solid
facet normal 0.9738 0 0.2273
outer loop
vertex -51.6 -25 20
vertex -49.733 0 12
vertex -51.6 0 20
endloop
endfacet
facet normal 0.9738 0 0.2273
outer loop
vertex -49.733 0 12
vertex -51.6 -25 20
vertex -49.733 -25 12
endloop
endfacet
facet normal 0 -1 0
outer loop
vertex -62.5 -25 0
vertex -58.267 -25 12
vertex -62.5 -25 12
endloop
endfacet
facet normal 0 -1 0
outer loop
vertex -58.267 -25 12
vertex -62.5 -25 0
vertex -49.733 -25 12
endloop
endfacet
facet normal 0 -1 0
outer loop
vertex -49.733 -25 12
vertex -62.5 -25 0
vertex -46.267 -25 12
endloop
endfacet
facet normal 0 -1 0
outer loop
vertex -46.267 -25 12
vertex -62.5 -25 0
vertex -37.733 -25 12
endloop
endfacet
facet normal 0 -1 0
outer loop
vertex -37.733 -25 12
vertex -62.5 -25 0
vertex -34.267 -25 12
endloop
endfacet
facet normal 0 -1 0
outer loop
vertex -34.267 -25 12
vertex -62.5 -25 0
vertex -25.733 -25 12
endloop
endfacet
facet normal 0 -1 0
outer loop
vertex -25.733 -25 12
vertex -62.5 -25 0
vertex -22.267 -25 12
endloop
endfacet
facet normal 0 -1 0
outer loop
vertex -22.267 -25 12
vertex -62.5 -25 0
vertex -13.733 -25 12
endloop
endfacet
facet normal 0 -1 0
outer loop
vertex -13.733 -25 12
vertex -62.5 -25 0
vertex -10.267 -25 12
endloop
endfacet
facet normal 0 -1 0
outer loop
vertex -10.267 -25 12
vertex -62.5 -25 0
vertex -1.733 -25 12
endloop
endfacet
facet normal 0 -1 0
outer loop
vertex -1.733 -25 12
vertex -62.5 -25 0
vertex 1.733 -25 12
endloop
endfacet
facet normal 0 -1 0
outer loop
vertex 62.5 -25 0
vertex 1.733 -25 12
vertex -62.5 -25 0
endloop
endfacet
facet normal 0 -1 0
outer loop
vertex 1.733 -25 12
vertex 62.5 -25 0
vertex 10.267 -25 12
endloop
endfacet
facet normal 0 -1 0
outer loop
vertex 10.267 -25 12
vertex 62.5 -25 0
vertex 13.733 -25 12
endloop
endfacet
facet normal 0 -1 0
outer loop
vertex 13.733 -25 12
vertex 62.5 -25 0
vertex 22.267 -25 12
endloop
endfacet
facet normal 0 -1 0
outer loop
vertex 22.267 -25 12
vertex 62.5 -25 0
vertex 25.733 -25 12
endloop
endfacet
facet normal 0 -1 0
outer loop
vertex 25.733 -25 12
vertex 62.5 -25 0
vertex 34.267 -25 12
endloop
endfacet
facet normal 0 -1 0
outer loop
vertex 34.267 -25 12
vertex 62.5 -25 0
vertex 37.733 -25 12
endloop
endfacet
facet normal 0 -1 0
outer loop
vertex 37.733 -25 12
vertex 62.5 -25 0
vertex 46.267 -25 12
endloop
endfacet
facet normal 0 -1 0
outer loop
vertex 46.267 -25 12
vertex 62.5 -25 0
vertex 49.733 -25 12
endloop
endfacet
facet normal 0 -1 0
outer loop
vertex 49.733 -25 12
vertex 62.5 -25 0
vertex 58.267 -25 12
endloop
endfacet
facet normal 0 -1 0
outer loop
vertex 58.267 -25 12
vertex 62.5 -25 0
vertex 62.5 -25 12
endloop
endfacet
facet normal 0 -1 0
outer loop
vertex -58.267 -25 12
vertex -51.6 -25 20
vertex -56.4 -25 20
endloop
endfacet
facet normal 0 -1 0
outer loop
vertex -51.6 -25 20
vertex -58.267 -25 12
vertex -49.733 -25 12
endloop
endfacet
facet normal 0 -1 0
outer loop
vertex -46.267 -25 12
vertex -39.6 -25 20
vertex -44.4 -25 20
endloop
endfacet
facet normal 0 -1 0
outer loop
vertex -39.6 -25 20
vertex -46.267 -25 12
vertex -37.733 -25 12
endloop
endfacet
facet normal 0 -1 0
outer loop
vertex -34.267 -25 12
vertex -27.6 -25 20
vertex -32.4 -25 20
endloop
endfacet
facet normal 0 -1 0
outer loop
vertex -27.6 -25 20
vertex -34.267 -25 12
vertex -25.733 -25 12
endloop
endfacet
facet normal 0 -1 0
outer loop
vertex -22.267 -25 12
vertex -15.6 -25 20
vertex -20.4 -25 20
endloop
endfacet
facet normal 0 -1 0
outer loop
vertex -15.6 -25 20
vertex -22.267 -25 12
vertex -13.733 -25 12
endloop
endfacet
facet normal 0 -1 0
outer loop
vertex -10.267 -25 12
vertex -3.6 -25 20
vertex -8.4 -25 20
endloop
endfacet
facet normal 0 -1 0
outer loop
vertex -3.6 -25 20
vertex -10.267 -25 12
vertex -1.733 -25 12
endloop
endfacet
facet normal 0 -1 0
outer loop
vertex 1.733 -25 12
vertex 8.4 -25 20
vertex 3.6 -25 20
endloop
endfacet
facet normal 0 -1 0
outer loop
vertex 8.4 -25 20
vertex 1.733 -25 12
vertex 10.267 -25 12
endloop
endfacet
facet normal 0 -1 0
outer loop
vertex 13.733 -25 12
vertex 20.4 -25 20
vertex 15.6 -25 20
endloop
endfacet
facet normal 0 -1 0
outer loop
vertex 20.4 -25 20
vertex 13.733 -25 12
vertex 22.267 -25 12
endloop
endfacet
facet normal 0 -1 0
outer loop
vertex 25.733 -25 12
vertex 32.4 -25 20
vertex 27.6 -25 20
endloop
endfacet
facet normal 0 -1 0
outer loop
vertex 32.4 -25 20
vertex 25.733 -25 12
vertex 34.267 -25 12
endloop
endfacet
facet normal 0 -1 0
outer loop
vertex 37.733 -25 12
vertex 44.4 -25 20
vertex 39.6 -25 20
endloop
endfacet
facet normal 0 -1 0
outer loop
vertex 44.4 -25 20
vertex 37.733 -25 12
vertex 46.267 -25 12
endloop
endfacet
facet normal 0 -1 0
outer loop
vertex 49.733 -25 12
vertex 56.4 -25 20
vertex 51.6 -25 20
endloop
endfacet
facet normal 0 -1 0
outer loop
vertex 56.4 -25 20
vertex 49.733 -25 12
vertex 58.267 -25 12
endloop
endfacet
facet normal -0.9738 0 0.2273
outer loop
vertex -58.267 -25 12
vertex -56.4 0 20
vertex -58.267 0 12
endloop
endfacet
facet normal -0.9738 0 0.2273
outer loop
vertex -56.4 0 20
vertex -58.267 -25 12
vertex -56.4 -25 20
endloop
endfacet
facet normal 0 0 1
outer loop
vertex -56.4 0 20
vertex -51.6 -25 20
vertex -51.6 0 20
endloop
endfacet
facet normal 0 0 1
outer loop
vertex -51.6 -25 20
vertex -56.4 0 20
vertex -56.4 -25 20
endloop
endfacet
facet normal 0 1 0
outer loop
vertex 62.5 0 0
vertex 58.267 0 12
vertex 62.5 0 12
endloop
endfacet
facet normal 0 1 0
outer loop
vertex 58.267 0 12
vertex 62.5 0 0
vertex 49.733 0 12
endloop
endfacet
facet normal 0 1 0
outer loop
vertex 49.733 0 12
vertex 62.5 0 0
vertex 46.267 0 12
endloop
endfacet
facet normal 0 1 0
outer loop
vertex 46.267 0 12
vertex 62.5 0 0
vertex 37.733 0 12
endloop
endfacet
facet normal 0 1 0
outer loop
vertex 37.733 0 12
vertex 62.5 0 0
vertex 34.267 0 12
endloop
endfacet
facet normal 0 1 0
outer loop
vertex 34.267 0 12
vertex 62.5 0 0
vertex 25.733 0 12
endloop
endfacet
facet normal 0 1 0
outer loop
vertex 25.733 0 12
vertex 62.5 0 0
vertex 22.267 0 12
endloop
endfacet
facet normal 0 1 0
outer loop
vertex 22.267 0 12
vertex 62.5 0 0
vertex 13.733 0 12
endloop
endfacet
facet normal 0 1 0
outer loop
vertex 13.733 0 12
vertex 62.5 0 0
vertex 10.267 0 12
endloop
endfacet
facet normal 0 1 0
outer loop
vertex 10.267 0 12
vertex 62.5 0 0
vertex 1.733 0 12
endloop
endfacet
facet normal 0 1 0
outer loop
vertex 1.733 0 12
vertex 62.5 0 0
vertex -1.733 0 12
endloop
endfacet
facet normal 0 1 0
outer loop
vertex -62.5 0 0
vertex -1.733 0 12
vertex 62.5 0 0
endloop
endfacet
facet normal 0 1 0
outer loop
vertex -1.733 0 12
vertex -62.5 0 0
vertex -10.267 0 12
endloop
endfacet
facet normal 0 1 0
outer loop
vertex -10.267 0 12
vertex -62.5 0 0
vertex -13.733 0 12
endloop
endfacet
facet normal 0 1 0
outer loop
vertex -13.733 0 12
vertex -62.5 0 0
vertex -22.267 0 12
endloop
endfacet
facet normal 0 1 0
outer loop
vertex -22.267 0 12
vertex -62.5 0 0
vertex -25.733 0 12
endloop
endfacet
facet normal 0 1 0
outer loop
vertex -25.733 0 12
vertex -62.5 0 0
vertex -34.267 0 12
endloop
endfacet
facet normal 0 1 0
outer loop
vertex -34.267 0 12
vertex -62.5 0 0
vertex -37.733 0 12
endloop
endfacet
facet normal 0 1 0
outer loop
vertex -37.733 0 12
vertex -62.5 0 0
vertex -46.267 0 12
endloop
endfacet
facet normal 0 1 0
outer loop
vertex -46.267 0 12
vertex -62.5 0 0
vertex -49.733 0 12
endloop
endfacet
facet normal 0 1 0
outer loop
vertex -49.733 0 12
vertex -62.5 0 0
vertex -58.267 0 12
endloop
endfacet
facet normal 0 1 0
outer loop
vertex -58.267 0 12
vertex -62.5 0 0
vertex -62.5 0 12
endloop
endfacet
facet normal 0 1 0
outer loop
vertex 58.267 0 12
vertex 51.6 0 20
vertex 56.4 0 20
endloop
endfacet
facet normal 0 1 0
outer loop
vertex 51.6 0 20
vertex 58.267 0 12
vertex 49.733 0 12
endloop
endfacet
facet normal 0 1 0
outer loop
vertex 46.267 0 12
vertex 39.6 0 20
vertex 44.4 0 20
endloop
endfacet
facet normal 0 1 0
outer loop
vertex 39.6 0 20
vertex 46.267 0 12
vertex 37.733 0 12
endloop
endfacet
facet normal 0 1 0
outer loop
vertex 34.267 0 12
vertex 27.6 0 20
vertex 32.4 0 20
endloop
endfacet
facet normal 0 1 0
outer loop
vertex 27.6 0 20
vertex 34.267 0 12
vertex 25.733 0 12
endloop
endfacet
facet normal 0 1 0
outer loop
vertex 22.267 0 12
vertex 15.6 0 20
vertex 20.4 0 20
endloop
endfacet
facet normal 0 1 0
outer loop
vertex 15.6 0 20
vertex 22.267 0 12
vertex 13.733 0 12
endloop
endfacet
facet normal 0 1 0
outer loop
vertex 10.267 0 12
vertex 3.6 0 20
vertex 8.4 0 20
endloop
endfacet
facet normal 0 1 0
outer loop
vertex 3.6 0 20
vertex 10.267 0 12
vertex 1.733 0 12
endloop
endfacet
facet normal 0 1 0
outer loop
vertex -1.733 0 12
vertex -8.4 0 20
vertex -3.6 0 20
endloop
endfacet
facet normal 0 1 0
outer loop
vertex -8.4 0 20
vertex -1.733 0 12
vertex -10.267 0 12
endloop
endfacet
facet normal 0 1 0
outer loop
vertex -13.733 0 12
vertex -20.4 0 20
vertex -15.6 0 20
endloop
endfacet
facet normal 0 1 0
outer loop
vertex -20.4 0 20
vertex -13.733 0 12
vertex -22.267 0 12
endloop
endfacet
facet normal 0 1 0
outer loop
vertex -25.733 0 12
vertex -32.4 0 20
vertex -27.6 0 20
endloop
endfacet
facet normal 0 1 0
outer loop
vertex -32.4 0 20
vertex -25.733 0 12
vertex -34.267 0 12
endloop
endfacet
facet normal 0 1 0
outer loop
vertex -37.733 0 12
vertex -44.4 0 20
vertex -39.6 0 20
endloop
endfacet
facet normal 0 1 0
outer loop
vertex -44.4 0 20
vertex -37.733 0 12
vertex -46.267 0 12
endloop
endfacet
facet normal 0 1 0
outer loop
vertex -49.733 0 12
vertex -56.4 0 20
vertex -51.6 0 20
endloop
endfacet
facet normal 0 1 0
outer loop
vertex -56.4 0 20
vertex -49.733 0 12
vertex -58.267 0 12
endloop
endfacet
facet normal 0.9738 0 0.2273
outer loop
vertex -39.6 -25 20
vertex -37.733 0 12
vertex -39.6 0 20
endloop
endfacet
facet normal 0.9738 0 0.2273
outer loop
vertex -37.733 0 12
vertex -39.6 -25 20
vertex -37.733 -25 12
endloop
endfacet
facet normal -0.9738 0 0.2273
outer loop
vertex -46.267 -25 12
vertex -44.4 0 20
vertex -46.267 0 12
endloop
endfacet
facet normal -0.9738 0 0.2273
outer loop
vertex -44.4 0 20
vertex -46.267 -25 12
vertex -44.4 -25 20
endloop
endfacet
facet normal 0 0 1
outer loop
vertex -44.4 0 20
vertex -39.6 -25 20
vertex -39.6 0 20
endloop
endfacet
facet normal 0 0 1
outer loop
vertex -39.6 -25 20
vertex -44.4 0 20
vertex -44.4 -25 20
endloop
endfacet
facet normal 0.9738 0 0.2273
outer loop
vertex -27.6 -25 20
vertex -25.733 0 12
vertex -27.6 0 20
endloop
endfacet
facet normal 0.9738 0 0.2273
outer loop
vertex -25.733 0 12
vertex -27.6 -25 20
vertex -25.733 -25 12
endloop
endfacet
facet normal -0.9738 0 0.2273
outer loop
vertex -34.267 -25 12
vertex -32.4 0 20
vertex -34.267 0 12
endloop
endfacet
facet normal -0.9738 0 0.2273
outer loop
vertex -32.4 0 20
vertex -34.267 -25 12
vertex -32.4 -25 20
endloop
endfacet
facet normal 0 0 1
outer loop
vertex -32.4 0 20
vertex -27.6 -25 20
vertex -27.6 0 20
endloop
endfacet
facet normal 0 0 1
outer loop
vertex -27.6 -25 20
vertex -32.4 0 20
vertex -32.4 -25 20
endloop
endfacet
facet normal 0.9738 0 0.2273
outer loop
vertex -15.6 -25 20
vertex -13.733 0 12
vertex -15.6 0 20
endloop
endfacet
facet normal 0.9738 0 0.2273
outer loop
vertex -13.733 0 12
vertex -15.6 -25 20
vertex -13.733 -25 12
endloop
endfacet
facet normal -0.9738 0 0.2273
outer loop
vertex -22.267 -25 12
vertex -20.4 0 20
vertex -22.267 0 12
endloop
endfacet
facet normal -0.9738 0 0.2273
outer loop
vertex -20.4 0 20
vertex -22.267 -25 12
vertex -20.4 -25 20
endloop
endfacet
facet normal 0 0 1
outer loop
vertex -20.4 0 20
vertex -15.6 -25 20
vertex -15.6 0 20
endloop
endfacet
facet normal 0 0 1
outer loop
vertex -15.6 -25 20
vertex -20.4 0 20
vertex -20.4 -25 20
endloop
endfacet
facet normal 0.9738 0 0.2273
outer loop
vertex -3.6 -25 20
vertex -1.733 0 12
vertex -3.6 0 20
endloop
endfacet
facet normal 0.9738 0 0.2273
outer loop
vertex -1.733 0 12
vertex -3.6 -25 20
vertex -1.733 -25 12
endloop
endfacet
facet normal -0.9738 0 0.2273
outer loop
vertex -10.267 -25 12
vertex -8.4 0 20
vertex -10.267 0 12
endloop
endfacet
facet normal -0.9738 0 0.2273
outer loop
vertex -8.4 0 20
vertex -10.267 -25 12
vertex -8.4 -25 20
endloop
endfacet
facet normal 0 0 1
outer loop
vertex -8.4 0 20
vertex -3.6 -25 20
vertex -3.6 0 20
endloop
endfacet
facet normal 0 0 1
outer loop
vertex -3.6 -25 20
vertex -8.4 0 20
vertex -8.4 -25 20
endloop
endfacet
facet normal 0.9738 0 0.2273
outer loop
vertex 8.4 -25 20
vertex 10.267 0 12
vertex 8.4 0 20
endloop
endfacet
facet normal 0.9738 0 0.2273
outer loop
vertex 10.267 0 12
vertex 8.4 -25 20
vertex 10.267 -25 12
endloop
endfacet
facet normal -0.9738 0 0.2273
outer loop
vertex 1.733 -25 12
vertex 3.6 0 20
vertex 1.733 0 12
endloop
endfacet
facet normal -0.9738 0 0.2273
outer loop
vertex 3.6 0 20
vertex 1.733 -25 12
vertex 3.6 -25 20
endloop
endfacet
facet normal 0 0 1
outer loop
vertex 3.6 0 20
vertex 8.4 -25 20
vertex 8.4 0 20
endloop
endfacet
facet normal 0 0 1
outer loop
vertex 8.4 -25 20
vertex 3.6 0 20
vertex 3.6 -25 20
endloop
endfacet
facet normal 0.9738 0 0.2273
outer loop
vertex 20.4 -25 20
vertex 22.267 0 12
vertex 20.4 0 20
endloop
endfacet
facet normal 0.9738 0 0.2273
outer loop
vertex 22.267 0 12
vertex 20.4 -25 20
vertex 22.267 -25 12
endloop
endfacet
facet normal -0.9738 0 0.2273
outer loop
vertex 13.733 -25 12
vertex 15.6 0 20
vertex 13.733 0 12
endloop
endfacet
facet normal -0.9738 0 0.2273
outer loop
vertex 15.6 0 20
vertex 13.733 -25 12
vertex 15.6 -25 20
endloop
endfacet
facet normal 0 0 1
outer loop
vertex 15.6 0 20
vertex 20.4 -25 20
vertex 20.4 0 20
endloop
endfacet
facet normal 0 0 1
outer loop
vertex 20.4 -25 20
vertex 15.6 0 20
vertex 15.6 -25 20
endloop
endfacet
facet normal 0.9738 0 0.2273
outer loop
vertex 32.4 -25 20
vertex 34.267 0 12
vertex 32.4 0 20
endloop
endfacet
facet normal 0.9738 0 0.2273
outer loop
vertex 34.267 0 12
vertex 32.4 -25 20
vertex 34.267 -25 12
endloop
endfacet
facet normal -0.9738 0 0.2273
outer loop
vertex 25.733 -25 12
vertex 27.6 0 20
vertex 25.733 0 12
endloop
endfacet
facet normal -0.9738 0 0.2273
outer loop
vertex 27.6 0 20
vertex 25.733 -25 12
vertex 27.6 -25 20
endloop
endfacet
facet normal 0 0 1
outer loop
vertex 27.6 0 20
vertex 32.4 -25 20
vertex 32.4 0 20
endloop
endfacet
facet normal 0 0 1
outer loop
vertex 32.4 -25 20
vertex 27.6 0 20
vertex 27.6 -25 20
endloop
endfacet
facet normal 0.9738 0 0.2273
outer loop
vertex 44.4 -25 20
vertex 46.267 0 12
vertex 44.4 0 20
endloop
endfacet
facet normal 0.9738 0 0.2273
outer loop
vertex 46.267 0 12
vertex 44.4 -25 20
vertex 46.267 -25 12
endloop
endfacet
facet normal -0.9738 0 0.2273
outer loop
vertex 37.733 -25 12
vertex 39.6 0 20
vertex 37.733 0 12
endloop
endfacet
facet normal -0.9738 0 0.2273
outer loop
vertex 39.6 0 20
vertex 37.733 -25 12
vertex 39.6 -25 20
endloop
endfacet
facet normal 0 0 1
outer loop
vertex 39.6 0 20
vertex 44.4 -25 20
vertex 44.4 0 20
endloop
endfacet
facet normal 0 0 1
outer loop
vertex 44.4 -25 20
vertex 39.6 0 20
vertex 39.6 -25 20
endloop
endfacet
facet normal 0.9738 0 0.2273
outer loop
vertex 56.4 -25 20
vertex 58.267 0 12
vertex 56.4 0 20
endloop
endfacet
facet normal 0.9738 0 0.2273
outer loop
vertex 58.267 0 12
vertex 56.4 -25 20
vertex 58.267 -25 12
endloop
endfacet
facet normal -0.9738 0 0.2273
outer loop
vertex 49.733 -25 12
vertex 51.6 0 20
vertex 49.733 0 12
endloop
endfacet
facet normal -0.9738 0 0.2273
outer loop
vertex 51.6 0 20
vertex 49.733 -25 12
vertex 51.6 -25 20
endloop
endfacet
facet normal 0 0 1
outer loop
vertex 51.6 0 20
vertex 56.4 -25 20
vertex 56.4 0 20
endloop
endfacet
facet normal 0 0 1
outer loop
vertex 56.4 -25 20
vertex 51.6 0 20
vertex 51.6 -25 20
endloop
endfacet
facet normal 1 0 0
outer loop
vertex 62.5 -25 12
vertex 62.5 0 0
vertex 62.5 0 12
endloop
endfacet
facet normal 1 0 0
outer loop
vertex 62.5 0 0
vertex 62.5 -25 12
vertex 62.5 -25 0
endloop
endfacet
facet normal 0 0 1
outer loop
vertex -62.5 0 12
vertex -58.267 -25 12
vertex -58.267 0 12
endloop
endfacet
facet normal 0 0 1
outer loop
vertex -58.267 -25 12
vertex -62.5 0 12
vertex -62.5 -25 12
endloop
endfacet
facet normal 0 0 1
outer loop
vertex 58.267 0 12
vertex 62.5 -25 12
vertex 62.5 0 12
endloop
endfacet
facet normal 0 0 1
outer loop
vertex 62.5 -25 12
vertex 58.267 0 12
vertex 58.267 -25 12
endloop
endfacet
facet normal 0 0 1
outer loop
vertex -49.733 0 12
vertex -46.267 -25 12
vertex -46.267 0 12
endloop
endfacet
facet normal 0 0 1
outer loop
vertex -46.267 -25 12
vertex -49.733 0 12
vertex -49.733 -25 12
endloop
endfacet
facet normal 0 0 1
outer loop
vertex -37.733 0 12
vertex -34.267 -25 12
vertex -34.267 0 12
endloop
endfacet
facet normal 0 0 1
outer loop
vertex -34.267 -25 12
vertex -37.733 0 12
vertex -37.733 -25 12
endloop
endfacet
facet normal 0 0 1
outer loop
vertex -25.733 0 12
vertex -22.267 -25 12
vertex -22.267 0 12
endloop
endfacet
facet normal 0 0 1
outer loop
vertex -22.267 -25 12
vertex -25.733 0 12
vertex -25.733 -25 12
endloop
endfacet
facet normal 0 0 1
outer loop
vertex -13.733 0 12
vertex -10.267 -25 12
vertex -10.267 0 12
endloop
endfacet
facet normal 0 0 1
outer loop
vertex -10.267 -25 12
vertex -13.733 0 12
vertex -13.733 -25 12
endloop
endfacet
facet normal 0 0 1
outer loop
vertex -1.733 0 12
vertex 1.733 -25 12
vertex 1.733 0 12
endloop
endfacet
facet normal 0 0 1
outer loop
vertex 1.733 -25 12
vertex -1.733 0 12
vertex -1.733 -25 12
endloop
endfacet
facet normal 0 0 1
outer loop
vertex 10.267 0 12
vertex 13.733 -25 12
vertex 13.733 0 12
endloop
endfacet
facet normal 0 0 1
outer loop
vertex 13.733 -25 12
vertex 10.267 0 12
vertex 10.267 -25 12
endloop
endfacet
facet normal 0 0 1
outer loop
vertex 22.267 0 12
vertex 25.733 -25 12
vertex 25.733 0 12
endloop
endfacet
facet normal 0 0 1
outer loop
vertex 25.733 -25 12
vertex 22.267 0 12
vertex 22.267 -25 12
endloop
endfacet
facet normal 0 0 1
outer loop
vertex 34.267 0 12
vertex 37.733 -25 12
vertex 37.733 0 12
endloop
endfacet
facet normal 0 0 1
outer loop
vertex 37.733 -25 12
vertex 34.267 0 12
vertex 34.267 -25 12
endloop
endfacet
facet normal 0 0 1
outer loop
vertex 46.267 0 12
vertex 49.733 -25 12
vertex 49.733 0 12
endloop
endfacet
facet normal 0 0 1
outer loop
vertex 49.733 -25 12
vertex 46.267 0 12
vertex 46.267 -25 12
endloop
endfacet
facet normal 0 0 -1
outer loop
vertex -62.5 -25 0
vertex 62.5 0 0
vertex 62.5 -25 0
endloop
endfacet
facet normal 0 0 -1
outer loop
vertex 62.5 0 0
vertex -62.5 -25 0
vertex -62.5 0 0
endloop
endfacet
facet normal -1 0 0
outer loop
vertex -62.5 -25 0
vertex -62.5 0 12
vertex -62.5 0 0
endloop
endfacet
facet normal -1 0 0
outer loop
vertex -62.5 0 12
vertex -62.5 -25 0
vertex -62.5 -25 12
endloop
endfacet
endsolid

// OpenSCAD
$fn = 32;

// ----------------------------------------------------------------------
// Toothed rack, 10 teeth
// 12 mm pitch, 8 mm teeth
// ----------------------------------------------------------------------

// --- parameters (mm) ---
bar_w = 25;      // bar width (Y)
seat_tol = 0.1;  // tolerance at the seating features
free_tol = 0.5;  // general tolerance on the free sizes
bar_h = 12;      // bar height (Z)
teeth = 10;      // number of teeth
pitch = 12;      // tooth pitch
tooth_h = 8;     // tooth height above the bar
root_w = 9;      // tooth width at the root
crest_w = 4.8;   // tooth width at the crest

// --- derived feature positions (mm) ---
span = (teeth - 1) * pitch;  // = 108   distance between the outer teeth
bar_l = span + root_w + 8;   // = 125   bar length: teeth plus 4 mm at each end
tooth_x = -span / 2;         // = -54   X of the first tooth
height = bar_h + tooth_h;    // = 20   overall height
feature_centers = [
  [tooth_x + 0 * pitch, -bar_w / 2],
  [tooth_x + 1 * pitch, -bar_w / 2],
  [tooth_x + 2 * pitch, -bar_w / 2],
  [tooth_x + 3 * pitch, -bar_w / 2],
  [tooth_x + 4 * pitch, -bar_w / 2],
  [tooth_x + 5 * pitch, -bar_w / 2],
  [tooth_x + 6 * pitch, -bar_w / 2],
  [tooth_x + 7 * pitch, -bar_w / 2],
  [tooth_x + 8 * pitch, -bar_w / 2],
  [tooth_x + 9 * pitch, -bar_w / 2]
];   // tooth centre line, drives the tooth loop

// bar with a rack of teeth, one extruded trapezoium per centre
module rack_tooth() {
  linear_extrude(height = bar_w)
    polygon(points = [
      [0, 0],
      [root_w, 0],
      [root_w / 2 + crest_w / 2, tooth_h + 1],
      [root_w / 2 - crest_w / 2, tooth_h + 1]
    ]);
}

union() {
  translate([-bar_l / 2, -bar_w, 0]) cube([bar_l, bar_w, bar_h]);
  for (centre = feature_centers)
    translate([centre[0] - root_w / 2, 0, bar_h - 1]) rotate([90, 0, 0]) rack_tooth();
}
